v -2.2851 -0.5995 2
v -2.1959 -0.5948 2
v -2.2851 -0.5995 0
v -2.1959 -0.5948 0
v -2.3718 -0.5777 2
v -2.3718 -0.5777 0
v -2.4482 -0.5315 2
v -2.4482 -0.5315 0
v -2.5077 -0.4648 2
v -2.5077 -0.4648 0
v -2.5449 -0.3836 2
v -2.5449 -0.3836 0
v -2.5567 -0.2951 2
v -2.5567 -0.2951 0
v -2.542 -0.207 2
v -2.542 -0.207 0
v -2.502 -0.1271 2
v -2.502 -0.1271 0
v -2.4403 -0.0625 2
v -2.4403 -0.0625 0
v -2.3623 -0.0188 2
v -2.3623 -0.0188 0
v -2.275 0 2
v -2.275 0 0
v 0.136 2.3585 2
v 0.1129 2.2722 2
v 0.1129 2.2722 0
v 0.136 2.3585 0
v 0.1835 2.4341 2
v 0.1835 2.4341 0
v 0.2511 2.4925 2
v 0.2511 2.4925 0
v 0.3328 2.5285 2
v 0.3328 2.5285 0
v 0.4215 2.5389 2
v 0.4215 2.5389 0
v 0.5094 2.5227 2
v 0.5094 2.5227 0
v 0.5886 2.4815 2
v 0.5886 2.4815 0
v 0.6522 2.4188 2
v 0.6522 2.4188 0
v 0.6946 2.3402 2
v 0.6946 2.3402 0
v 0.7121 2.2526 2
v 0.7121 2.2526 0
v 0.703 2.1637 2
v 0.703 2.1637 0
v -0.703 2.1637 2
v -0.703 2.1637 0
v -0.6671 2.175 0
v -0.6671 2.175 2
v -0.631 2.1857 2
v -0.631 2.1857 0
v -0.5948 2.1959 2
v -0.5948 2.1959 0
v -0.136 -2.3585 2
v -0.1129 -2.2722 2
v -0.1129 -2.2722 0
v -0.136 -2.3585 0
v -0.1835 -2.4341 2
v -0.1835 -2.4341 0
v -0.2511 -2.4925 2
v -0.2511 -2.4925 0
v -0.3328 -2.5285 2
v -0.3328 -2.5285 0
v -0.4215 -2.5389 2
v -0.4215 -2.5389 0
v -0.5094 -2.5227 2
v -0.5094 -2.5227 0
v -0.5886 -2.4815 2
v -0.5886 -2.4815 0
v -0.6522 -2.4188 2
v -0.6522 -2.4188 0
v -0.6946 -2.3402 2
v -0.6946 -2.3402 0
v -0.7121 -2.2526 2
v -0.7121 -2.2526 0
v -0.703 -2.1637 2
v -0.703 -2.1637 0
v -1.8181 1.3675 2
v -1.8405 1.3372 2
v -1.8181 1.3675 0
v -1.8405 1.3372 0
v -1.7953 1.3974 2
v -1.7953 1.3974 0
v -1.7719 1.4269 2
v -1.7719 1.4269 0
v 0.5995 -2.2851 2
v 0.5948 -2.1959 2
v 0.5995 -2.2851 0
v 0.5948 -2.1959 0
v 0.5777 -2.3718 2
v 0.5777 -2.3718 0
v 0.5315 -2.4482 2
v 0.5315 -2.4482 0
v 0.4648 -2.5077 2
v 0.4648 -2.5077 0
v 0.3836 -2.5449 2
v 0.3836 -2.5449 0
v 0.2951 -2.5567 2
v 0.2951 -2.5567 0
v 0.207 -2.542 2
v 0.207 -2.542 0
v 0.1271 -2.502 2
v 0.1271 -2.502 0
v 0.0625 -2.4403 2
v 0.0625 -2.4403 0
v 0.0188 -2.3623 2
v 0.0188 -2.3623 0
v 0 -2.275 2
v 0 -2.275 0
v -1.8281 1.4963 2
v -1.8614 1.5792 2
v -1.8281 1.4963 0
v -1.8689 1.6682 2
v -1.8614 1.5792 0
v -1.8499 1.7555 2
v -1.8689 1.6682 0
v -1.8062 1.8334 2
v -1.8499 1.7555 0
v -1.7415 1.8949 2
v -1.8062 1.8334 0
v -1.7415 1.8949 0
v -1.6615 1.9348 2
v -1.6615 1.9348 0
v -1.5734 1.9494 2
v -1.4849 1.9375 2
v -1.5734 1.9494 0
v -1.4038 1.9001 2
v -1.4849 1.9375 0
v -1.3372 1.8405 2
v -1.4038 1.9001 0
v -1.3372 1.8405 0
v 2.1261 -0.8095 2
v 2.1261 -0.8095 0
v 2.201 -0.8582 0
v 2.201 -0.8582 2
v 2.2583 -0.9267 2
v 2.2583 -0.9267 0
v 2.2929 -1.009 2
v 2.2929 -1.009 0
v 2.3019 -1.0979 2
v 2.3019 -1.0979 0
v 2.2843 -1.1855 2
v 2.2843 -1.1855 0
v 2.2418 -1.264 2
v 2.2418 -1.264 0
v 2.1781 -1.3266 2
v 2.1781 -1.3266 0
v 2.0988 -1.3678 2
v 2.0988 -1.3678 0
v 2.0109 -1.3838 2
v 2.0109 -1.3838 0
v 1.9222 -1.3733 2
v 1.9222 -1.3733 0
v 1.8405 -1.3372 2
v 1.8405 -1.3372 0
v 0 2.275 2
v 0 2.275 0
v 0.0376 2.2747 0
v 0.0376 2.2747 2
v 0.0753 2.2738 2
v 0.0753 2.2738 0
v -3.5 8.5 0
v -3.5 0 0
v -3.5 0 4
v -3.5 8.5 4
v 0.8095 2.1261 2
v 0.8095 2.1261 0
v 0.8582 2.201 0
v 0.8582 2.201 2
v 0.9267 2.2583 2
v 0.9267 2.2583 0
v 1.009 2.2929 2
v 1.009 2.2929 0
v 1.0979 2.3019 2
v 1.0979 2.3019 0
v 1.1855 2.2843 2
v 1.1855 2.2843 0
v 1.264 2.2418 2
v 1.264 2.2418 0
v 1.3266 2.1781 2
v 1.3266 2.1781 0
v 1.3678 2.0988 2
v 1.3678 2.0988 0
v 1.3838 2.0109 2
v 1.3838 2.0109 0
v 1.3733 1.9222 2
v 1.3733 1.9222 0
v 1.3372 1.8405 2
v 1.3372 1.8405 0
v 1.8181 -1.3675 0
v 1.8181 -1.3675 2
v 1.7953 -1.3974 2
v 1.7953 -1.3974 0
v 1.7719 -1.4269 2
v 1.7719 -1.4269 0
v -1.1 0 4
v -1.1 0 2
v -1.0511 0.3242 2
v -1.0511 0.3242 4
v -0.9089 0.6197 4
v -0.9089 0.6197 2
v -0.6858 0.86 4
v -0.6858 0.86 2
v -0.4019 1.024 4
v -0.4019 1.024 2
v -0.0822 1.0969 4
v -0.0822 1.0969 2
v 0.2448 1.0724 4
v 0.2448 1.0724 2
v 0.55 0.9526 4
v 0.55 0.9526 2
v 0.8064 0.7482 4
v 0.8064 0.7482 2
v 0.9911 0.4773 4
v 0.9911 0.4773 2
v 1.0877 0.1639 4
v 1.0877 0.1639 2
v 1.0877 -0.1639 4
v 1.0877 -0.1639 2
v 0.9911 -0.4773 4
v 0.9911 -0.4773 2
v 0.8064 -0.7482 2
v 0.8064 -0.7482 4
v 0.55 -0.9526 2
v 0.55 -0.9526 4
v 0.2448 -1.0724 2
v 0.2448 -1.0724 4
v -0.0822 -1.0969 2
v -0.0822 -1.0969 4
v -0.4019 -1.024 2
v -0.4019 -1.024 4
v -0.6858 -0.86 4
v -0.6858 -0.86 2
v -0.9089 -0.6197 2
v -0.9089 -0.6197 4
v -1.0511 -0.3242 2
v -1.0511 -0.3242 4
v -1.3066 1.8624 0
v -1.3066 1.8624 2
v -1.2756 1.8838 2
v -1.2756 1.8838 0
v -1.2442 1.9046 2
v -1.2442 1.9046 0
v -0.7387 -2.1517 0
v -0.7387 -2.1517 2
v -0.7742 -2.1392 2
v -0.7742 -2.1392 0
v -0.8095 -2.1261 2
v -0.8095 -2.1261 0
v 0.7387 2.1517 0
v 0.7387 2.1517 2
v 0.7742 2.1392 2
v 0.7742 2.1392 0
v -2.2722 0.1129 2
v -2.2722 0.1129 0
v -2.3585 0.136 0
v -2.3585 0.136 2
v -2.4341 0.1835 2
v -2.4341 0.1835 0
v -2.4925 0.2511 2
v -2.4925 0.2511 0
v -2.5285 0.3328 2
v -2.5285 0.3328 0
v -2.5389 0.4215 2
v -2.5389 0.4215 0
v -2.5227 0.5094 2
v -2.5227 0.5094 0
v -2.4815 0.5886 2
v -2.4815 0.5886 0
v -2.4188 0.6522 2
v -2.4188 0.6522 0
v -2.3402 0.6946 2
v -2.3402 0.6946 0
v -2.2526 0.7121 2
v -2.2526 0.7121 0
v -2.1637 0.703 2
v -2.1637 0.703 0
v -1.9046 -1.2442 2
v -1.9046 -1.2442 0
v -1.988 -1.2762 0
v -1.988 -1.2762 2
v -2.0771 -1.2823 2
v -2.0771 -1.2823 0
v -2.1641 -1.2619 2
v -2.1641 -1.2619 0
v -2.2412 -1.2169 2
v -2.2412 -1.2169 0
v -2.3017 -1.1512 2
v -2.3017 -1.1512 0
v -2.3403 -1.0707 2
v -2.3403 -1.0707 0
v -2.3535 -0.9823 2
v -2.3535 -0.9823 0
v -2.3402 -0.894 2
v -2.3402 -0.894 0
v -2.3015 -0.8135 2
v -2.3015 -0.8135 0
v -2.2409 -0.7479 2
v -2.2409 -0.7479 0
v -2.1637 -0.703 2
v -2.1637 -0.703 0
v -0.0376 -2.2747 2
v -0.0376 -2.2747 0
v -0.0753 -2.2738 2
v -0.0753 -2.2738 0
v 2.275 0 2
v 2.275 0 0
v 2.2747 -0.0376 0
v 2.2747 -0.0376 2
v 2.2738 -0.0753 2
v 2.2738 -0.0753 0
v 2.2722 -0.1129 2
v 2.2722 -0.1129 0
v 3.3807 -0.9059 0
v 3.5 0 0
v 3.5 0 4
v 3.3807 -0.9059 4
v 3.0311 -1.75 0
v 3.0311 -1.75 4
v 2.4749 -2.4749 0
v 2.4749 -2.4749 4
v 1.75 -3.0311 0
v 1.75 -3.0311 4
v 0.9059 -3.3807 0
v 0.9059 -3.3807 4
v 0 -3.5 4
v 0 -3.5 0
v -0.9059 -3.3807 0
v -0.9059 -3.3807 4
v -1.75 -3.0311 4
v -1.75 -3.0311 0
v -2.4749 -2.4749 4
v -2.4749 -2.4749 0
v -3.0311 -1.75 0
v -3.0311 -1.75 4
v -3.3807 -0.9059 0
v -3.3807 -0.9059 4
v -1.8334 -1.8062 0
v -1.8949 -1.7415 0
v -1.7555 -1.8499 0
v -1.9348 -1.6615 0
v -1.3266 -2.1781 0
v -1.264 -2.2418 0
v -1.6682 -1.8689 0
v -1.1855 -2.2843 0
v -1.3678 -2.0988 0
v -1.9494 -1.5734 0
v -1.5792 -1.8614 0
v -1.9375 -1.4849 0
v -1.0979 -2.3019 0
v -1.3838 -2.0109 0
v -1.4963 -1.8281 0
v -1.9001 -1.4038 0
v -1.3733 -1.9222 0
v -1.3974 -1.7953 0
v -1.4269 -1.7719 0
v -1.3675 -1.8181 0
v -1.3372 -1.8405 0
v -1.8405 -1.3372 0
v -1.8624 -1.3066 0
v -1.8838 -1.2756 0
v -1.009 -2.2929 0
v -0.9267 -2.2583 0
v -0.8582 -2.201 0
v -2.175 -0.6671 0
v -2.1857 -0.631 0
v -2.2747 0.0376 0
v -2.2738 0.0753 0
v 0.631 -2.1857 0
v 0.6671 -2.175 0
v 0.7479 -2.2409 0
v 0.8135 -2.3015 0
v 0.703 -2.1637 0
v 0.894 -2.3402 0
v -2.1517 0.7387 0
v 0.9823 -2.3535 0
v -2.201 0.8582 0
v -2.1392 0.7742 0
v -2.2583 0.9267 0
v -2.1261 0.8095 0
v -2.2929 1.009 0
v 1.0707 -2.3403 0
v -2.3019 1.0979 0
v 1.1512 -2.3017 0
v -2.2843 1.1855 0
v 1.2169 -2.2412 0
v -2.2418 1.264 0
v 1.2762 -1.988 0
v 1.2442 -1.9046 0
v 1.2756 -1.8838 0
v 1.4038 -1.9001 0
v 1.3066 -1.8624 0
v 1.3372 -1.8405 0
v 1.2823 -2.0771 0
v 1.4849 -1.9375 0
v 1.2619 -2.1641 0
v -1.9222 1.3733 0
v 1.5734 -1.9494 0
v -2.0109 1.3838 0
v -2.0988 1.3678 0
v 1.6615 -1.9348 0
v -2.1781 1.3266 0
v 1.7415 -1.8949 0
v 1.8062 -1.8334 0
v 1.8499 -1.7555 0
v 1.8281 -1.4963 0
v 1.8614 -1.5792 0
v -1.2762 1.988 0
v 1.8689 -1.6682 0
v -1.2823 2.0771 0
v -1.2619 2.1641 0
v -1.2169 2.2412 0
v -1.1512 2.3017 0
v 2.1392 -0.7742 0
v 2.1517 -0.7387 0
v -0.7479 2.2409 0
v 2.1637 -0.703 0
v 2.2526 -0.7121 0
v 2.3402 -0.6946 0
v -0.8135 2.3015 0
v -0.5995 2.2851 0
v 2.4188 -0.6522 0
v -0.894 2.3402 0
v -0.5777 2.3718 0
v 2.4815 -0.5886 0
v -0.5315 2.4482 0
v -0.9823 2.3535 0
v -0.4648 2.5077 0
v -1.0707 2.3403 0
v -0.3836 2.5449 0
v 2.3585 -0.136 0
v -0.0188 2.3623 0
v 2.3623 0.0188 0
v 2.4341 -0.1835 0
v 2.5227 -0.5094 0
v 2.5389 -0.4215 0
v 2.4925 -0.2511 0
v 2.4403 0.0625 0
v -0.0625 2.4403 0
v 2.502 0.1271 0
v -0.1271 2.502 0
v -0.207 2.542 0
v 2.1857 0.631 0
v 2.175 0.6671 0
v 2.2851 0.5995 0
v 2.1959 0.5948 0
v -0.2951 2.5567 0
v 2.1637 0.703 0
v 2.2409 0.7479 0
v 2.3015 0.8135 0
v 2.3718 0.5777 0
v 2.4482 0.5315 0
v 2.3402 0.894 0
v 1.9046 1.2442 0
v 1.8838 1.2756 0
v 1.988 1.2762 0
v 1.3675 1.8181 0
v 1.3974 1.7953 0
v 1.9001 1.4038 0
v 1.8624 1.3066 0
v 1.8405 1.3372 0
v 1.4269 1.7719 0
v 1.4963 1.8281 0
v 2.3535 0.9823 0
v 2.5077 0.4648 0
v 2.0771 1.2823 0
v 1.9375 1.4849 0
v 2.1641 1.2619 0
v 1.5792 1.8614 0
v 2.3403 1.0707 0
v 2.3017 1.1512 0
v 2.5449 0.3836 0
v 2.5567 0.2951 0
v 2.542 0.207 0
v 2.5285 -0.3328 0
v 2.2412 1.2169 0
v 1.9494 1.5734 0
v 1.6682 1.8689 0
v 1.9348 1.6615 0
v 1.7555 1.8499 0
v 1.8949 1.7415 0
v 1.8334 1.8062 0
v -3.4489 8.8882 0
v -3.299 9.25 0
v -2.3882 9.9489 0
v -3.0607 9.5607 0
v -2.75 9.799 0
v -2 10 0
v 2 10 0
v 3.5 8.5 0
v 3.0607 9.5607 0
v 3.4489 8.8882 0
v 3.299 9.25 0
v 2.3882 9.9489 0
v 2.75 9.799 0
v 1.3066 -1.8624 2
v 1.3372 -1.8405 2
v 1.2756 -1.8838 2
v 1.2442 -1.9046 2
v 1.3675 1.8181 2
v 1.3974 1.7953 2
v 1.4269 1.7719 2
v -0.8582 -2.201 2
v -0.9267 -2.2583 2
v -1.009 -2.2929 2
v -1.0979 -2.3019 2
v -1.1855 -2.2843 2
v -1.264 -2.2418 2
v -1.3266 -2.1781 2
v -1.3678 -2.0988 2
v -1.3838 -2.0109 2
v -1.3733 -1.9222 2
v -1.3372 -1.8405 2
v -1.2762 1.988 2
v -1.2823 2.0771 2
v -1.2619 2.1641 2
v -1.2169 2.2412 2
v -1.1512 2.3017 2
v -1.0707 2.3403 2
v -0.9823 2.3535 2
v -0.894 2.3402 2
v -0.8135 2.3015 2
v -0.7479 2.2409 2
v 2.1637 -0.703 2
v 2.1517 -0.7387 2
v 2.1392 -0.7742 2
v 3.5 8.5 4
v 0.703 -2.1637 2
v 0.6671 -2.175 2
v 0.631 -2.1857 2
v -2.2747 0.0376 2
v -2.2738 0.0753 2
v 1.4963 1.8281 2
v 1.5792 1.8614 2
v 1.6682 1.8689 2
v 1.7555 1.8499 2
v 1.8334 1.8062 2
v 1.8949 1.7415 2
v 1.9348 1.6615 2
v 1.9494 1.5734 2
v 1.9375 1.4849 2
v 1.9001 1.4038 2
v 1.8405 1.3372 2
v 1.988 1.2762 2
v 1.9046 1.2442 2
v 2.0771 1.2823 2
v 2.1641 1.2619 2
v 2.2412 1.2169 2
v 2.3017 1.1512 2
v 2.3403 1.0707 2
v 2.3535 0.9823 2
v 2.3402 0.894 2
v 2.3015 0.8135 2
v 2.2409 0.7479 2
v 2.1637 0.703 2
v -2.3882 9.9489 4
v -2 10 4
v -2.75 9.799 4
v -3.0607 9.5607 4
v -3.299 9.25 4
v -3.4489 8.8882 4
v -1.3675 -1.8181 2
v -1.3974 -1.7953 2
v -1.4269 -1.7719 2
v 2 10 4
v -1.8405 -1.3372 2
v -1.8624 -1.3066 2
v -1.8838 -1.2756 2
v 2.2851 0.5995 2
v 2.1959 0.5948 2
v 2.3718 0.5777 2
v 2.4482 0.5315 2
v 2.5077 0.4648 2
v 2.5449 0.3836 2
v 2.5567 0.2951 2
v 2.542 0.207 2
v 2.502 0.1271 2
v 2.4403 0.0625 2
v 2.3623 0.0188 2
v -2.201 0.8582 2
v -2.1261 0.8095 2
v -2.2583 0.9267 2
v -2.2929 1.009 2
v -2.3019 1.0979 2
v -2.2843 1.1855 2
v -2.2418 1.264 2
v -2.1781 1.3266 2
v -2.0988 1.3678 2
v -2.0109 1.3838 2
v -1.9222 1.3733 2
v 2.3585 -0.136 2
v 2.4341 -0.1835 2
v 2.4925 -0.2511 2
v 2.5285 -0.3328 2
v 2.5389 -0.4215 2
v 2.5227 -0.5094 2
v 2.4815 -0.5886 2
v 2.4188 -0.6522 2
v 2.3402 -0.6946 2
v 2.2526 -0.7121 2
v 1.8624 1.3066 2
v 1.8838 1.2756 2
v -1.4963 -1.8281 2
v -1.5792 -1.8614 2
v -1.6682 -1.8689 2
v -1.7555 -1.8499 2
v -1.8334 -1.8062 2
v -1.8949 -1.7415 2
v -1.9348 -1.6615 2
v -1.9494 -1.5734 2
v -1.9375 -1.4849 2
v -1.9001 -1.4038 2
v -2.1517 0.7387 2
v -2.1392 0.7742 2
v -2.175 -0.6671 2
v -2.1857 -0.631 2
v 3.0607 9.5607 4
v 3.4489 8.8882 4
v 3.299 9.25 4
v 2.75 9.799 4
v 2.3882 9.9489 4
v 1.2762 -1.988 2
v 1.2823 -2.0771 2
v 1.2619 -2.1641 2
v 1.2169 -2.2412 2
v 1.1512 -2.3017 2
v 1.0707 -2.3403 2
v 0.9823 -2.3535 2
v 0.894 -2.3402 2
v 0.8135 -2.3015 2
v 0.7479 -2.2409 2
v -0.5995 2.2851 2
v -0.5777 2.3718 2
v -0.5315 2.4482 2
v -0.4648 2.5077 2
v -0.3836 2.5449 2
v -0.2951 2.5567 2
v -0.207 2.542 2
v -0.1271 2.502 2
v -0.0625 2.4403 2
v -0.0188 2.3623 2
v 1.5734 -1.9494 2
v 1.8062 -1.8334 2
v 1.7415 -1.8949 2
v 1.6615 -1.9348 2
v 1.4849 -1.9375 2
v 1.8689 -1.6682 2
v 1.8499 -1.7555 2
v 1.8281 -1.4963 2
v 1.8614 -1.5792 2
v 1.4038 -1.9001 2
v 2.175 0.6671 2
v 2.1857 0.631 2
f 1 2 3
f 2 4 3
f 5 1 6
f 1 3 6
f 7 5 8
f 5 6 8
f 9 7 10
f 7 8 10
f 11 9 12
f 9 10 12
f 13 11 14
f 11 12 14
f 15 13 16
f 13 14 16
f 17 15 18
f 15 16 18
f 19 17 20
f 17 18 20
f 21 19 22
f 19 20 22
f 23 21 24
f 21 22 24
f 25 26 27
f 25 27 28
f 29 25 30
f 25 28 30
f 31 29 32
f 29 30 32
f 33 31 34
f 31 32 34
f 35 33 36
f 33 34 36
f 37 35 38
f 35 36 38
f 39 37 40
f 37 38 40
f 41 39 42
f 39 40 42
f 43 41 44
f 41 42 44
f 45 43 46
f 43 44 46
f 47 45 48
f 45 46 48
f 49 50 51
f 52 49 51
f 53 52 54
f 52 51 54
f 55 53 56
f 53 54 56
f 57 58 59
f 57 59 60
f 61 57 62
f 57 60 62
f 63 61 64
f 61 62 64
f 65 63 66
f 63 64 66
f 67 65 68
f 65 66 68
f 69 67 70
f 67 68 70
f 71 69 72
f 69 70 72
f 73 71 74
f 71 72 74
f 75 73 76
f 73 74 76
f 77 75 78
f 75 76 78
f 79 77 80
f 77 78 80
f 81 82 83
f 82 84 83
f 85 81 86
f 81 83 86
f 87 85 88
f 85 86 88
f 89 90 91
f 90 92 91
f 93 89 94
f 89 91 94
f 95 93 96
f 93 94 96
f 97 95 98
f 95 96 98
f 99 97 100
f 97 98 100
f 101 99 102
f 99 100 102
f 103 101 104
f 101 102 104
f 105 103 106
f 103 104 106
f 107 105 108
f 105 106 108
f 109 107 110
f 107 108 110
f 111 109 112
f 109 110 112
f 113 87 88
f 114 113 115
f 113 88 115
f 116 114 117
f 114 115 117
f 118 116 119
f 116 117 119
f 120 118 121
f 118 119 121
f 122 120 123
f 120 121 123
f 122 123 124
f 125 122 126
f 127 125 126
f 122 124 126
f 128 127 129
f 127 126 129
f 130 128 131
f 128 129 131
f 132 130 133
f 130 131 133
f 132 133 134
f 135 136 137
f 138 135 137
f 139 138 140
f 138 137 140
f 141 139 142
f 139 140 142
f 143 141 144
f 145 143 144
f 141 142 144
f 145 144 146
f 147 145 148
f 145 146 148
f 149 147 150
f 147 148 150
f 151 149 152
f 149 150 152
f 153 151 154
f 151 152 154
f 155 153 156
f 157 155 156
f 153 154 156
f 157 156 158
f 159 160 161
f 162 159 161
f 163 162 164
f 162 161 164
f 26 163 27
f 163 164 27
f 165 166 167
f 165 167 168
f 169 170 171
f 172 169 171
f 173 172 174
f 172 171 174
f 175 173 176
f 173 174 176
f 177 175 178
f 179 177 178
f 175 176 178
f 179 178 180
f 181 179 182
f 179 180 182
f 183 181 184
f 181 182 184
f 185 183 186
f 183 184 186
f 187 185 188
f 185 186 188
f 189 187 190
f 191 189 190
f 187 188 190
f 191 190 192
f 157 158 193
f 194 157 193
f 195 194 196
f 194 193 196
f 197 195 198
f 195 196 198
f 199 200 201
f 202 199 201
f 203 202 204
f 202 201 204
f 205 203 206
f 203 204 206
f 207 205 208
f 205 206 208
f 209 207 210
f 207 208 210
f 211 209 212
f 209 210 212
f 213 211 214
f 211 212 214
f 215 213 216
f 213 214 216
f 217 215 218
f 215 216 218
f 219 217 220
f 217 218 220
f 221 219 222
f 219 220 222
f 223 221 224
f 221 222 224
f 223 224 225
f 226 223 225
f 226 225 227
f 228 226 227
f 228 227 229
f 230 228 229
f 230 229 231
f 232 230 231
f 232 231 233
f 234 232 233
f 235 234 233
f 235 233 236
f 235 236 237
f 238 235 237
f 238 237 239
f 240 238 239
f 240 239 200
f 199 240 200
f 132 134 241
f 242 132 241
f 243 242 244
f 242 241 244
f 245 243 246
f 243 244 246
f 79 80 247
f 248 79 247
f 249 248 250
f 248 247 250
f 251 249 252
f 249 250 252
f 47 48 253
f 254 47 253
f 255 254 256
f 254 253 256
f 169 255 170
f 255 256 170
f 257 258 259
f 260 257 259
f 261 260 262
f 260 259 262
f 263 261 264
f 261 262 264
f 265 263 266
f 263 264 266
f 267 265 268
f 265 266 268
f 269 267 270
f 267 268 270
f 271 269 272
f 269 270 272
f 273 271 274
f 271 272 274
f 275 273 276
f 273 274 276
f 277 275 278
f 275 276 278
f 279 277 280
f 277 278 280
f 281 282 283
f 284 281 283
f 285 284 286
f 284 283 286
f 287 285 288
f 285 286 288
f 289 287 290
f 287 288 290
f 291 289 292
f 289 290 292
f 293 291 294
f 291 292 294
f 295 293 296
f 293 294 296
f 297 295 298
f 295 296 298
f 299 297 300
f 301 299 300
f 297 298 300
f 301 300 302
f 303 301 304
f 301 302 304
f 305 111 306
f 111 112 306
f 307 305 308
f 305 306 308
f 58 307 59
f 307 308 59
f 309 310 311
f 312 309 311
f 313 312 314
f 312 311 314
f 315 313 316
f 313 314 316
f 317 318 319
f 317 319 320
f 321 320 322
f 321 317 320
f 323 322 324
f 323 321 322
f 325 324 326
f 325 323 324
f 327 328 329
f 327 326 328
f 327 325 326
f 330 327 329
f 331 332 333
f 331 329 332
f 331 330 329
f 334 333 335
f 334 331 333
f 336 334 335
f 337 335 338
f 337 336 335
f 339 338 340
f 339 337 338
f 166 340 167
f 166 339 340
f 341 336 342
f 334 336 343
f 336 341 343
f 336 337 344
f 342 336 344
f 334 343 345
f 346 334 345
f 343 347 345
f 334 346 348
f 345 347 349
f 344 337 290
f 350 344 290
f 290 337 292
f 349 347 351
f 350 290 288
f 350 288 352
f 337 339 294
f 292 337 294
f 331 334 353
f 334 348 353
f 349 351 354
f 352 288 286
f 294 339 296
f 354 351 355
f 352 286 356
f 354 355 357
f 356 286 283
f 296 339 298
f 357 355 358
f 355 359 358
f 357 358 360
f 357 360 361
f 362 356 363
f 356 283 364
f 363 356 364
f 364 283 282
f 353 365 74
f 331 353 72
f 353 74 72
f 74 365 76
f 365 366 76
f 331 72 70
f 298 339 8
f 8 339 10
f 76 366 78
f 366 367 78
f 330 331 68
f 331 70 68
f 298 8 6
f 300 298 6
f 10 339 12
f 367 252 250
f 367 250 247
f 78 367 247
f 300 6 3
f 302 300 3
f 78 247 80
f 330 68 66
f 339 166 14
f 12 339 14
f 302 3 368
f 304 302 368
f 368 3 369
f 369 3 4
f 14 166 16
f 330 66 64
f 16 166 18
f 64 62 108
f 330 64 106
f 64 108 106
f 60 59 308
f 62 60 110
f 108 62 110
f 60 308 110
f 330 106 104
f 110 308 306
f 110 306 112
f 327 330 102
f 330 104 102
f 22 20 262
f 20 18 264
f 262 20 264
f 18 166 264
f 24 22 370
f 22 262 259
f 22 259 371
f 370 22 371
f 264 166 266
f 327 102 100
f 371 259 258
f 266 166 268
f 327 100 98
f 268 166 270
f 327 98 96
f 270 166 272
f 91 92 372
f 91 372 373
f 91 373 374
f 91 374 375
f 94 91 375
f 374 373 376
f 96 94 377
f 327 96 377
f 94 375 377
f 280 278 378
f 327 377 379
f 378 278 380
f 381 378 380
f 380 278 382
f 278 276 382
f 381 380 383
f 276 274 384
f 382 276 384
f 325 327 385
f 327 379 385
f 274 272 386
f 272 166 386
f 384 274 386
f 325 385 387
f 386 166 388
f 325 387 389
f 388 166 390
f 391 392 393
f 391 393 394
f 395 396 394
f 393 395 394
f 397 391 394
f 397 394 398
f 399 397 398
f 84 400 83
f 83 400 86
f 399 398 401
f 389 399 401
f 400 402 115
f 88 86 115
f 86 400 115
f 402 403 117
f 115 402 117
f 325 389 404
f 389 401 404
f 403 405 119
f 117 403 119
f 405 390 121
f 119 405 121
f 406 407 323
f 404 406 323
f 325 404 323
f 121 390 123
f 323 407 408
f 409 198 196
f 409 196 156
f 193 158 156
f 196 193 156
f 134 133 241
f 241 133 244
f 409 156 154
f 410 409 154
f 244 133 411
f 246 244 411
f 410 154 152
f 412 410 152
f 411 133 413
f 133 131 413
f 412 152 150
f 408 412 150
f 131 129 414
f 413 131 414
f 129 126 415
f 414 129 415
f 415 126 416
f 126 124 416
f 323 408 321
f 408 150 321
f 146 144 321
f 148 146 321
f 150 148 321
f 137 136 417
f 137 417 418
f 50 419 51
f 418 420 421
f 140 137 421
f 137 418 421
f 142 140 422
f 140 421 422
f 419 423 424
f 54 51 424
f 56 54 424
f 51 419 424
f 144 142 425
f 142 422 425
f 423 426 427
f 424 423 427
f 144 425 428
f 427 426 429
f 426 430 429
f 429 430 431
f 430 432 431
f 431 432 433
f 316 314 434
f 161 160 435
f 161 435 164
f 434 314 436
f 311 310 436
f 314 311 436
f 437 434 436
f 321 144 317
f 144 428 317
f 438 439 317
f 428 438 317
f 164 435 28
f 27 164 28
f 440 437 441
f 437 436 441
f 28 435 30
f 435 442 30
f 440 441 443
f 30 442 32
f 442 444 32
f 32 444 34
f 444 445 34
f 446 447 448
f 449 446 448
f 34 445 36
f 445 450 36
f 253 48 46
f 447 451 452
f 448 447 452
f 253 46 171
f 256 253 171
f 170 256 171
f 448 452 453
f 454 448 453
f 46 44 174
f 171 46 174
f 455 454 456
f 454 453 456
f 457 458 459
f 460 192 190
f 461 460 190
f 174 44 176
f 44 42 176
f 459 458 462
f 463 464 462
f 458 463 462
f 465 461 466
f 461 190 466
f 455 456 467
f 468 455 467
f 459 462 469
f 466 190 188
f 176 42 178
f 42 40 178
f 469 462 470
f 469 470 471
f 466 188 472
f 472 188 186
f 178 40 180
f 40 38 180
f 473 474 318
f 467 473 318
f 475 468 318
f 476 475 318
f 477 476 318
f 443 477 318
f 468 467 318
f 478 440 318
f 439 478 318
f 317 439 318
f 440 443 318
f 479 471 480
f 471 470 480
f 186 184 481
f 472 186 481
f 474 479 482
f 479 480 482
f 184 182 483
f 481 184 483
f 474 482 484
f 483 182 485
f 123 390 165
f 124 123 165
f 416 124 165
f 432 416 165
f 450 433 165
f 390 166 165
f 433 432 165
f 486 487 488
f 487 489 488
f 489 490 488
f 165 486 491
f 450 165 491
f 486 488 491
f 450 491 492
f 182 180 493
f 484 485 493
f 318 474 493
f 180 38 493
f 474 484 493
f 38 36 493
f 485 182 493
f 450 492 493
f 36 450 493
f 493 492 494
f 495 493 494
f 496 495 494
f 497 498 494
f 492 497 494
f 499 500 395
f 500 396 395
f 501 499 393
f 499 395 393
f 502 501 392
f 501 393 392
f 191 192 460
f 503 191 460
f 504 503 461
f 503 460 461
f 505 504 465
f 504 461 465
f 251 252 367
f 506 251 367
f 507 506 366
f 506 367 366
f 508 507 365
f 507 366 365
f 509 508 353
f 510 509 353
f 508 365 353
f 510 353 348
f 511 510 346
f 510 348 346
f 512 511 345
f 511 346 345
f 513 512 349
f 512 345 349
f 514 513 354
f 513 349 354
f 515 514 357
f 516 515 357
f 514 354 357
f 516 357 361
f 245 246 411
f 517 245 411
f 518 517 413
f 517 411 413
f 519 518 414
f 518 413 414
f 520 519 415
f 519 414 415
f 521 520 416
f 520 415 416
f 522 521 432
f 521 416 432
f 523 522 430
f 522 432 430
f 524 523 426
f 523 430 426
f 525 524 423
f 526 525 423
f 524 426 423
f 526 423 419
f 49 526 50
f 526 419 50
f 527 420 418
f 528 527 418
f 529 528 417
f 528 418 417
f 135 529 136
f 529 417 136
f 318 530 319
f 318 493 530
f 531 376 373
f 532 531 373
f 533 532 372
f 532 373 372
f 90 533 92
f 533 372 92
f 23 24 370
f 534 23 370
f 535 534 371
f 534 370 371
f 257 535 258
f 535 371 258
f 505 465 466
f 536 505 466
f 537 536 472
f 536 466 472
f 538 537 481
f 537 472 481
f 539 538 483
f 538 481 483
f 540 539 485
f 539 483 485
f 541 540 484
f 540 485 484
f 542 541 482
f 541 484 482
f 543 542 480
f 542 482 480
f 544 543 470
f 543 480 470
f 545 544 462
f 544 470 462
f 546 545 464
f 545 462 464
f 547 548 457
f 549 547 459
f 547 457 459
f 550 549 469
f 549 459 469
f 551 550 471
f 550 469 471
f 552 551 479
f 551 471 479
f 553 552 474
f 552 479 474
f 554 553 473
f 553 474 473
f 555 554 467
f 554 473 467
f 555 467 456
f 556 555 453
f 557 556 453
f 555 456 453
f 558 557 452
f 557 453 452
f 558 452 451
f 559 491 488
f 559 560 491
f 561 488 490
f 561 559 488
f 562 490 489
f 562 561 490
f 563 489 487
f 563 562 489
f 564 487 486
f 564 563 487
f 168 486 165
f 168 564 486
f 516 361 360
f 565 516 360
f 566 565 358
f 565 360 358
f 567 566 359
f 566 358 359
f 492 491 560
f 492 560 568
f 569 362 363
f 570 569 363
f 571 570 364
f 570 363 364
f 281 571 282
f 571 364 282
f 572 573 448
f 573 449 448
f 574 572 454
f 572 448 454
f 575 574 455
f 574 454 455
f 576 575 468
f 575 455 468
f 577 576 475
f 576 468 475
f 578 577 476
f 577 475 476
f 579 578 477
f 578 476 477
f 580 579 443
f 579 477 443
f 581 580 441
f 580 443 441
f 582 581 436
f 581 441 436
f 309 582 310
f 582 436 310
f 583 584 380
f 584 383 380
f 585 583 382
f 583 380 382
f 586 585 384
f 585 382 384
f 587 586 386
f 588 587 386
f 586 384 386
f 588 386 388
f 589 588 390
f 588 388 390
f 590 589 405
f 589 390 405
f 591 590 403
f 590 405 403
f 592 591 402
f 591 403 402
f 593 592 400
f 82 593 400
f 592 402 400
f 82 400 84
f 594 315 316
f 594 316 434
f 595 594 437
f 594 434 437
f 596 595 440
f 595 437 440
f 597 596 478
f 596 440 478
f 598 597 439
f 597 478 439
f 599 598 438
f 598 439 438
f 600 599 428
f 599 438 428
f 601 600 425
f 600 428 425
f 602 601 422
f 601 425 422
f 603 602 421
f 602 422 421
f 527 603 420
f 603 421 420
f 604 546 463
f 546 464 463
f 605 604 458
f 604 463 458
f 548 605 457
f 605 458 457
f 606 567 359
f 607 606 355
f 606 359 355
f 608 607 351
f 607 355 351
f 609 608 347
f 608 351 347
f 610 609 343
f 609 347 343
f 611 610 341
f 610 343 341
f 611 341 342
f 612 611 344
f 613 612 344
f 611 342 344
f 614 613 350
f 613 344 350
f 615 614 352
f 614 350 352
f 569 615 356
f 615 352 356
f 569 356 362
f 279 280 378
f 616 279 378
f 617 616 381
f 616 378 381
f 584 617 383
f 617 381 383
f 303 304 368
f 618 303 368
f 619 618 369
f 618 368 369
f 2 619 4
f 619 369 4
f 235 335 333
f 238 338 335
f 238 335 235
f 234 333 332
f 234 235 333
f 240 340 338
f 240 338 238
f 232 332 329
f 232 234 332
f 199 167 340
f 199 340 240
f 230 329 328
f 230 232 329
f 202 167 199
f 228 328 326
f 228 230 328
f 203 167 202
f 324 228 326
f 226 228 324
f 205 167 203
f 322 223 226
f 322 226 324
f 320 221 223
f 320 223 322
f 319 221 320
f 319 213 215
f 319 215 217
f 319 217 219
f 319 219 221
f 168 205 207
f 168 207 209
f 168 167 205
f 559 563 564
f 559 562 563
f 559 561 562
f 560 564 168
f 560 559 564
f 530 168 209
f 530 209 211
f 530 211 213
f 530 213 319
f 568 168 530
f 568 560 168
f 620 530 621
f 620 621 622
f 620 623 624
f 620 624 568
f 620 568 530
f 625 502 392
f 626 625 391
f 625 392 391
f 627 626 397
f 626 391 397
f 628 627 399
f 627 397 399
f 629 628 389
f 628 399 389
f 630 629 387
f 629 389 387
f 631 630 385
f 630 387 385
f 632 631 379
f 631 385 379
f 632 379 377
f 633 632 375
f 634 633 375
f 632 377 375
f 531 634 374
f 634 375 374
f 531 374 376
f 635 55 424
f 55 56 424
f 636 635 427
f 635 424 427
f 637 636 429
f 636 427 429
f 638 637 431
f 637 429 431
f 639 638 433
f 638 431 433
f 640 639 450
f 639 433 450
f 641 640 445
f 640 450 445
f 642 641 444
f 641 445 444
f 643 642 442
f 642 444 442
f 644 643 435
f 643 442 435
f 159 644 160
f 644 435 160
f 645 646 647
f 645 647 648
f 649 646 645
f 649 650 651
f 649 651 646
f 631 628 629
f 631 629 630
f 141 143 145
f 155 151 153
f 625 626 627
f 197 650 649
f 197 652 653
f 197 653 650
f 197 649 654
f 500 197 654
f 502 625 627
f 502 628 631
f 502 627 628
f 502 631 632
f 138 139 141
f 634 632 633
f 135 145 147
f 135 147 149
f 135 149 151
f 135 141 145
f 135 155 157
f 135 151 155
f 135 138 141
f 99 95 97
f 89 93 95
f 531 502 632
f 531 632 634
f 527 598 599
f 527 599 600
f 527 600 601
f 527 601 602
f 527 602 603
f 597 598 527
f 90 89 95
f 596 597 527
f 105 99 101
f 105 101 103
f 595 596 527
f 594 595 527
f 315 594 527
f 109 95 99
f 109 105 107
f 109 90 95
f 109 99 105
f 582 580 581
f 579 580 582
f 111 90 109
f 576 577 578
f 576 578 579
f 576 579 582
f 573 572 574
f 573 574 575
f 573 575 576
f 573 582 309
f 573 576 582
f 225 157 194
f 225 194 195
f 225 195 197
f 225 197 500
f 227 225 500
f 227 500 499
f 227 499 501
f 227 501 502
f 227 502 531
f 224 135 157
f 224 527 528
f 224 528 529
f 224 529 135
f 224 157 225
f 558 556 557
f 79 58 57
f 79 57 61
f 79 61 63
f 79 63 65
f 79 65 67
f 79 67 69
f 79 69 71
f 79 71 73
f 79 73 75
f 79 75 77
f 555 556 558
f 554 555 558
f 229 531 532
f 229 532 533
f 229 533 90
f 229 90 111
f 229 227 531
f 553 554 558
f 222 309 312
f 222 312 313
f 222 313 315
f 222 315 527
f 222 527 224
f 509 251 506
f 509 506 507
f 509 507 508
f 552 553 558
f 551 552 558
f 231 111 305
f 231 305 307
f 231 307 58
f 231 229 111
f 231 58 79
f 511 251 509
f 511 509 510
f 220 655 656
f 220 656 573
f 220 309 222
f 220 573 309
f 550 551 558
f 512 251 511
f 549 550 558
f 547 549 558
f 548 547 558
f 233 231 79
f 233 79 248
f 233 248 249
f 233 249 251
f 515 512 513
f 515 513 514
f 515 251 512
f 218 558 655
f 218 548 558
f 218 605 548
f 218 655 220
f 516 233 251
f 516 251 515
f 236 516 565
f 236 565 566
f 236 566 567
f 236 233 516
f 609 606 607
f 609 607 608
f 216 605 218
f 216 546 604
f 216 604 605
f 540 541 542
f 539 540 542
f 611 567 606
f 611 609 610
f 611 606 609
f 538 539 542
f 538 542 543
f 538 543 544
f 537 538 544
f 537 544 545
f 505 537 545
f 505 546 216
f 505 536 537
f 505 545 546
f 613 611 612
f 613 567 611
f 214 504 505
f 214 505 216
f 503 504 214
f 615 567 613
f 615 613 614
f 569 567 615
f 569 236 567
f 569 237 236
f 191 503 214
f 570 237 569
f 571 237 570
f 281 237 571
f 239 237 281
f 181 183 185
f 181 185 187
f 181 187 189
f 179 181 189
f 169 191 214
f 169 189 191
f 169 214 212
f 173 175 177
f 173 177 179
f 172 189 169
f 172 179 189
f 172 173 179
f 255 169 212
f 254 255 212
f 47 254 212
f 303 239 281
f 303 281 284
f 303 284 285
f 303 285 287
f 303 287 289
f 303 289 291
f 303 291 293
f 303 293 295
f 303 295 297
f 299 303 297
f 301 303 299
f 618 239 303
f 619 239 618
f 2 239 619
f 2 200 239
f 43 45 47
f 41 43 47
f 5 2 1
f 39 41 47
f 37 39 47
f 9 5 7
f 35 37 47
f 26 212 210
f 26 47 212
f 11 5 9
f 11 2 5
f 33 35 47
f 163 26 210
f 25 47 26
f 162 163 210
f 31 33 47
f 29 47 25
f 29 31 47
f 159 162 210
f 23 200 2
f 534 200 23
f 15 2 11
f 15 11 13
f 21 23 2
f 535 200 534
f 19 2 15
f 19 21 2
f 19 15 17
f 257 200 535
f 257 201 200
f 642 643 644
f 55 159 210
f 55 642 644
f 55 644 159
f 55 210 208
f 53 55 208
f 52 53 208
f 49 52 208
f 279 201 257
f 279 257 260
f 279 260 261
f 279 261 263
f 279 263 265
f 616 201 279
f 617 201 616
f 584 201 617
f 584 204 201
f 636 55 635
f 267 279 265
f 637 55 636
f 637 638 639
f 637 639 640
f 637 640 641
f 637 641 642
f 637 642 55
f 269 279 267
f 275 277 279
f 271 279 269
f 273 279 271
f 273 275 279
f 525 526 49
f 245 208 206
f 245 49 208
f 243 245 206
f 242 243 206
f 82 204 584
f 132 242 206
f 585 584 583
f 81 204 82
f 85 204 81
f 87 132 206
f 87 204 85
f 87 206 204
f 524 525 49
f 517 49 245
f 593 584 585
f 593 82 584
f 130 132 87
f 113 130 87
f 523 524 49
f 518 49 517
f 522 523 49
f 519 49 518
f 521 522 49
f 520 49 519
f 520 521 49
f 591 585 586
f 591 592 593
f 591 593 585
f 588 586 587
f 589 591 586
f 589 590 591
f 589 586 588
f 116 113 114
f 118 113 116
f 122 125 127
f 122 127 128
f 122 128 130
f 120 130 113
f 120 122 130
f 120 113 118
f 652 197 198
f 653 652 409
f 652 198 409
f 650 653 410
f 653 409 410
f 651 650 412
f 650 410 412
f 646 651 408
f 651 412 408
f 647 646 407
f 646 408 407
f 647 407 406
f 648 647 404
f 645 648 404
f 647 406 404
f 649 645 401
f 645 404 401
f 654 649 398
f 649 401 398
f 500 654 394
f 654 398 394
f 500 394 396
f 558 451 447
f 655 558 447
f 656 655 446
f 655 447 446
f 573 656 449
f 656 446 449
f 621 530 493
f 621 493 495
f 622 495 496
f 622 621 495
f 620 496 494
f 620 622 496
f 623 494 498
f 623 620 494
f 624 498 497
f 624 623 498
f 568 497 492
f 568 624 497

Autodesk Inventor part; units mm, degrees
ref_plane "YZ Plane" through (0, 0, 0) normal (1, 0, 0) x (0, 1, 0)
ref_plane "XZ Plane" through (0, 0, 0) normal (0, 1, 0) x (-1, 0, 0)
ref_plane "XY Plane" through (0, 0, 0) normal (0, 0, 1) x (1, 0, 0)
sketch "Sketch1 - base" plane through (0, 0, 0) normal (0, 0, 1) x (1, 0, 0)
  circle A0 centre (0, 0) radius 3.5
  line L0 (-3.5, 0) -> (-3.5, 10)
  line L1 (-3.5, 10) -> (3.5, 10)
  line L2 (3.5, 10) -> (3.5, 0)
  dimension "d0" = 7
  dimension "d1" = 10
extrude "Extrusion1" add sketch "Sketch1 - base" along normal blind 4
sketch "Sketch2 - axle_hole" plane through (0, 0, 0) normal (0, 0, -1) x (-1, 0, 0)
  circle A0 centre (0, 0) radius 2.275
  arc A1 (-2.1959, 0.5948) -> (-2.275, 0) centre (-2.256, 0.3001) ccw
  line L0 (-2.256, 0.3001) -> (-2.5544, 0.3398) construction
  arc A2 (-2.2722, -0.1129) -> (-2.1637, -0.703) centre (-2.2383, -0.4117) ccw
  arc A3 (-2.1261, -0.8095) -> (-1.8405, -1.3372) centre (-2.0015, -1.0832) ccw
  arc A4 (-1.7719, -1.4269) -> (-1.3372, -1.8405) centre (-1.5688, -1.6487) ccw
  arc A5 (-1.2442, -1.9046) -> (-0.703, -2.1637) centre (-0.9826, -2.0528) ccw
  arc A6 (-0.5948, -2.1959) -> (0, -2.275) centre (-0.3001, -2.256) ccw
  arc A7 (0.1129, -2.2722) -> (0.703, -2.1637) centre (0.4117, -2.2383) ccw
  arc A8 (0.8095, -2.1261) -> (1.3372, -1.8405) centre (1.0832, -2.0015) ccw
  arc A9 (1.4269, -1.7719) -> (1.8405, -1.3372) centre (1.6487, -1.5688) ccw
  arc A10 (1.9046, -1.2442) -> (2.1637, -0.703) centre (2.0528, -0.9826) ccw
  arc A11 (2.1959, -0.5948) -> (2.275, 0) centre (2.256, -0.3001) ccw
  arc A12 (2.2722, 0.1129) -> (2.1637, 0.703) centre (2.2383, 0.4117) ccw
  arc A13 (2.1261, 0.8095) -> (1.8405, 1.3372) centre (2.0015, 1.0832) ccw
  arc A14 (1.7719, 1.4269) -> (1.3372, 1.8405) centre (1.5688, 1.6487) ccw
  arc A15 (1.2442, 1.9046) -> (0.703, 2.1637) centre (0.9826, 2.0528) ccw
  arc A16 (0.5948, 2.1959) -> (0, 2.275) centre (0.3001, 2.256) ccw
  arc A17 (-0.1129, 2.2722) -> (-0.703, 2.1637) centre (-0.4117, 2.2383) ccw
  arc A18 (-0.8095, 2.1261) -> (-1.3372, 1.8405) centre (-1.0832, 2.0015) ccw
  arc A19 (-1.4269, 1.7719) -> (-1.8405, 1.3372) centre (-1.6487, 1.5688) ccw
  arc A20 (-1.9046, 1.2442) -> (-2.1637, 0.703) centre (-2.0528, 0.9826) ccw
  point P0 (-2.2722, -0.1129)
  point P1 (-2.1261, -0.8095)
  point P2 (-1.8405, -1.3372)
  point P3 (-1.3372, -1.8405)
  point P4 (-1.2442, -1.9046)
  point P5 (-0.5948, -2.1959)
  point P6 (0, -2.275)
  point P7 (0.1129, -2.2722)
  point P8 (0.8095, -2.1261)
  point P9 (1.3372, -1.8405)
  point P10 (1.4269, -1.7719)
  point P11 (1.8405, -1.3372)
  point P12 (1.9046, -1.2442)
  point P13 (2.1637, -0.703)
  point P14 (2.1959, -0.5948)
  point P15 (2.275, 0)
  point P16 (2.2722, 0.1129)
  point P17 (2.1637, 0.703)
  point P18 (2.1261, 0.8095)
  point P19 (1.8405, 1.3372)
  point P20 (1.7719, 1.4269)
  point P21 (1.3372, 1.8405)
  point P22 (1.2442, 1.9046)
  point P23 (0.703, 2.1637)
  point P24 (0.5948, 2.1959)
  point P25 (0, 2.275)
  point P26 (-0.1129, 2.2722)
  point P27 (-0.703, 2.1637)
  point P28 (-0.8095, 2.1261)
  point P29 (-1.3372, 1.8405)
  point P30 (-1.4269, 1.7719)
  point P31 (-1.8405, 1.3372)
  point P32 (-1.9046, 1.2442)
  point P33 (-2.1637, 0.703)
  dimension "d4" = 4.55
  dimension "d16" = 0.6
  dimension "d17" = 0.301
  dimension "d20" = 360
extrude "Extrusion2" cut sketch "Sketch2 - axle_hole" against normal blind 2
sketch "Sketch3 - screw_hole" plane through (0, 0, 0) normal (0, 0, -1) x (-1, 0, 0)
  circle A0 centre (0, 0) radius 1.1
  dimension "d12" = 2.2
extrude "Extrusion3" cut sketch "Sketch3 - screw_hole" against normal blind 4
fillet "Fillet1" radius 1.5 2 edges at (3.5, 10, 2) (-3.5, 10, 2)
properties part number "Motor Axle Fitting Test"
